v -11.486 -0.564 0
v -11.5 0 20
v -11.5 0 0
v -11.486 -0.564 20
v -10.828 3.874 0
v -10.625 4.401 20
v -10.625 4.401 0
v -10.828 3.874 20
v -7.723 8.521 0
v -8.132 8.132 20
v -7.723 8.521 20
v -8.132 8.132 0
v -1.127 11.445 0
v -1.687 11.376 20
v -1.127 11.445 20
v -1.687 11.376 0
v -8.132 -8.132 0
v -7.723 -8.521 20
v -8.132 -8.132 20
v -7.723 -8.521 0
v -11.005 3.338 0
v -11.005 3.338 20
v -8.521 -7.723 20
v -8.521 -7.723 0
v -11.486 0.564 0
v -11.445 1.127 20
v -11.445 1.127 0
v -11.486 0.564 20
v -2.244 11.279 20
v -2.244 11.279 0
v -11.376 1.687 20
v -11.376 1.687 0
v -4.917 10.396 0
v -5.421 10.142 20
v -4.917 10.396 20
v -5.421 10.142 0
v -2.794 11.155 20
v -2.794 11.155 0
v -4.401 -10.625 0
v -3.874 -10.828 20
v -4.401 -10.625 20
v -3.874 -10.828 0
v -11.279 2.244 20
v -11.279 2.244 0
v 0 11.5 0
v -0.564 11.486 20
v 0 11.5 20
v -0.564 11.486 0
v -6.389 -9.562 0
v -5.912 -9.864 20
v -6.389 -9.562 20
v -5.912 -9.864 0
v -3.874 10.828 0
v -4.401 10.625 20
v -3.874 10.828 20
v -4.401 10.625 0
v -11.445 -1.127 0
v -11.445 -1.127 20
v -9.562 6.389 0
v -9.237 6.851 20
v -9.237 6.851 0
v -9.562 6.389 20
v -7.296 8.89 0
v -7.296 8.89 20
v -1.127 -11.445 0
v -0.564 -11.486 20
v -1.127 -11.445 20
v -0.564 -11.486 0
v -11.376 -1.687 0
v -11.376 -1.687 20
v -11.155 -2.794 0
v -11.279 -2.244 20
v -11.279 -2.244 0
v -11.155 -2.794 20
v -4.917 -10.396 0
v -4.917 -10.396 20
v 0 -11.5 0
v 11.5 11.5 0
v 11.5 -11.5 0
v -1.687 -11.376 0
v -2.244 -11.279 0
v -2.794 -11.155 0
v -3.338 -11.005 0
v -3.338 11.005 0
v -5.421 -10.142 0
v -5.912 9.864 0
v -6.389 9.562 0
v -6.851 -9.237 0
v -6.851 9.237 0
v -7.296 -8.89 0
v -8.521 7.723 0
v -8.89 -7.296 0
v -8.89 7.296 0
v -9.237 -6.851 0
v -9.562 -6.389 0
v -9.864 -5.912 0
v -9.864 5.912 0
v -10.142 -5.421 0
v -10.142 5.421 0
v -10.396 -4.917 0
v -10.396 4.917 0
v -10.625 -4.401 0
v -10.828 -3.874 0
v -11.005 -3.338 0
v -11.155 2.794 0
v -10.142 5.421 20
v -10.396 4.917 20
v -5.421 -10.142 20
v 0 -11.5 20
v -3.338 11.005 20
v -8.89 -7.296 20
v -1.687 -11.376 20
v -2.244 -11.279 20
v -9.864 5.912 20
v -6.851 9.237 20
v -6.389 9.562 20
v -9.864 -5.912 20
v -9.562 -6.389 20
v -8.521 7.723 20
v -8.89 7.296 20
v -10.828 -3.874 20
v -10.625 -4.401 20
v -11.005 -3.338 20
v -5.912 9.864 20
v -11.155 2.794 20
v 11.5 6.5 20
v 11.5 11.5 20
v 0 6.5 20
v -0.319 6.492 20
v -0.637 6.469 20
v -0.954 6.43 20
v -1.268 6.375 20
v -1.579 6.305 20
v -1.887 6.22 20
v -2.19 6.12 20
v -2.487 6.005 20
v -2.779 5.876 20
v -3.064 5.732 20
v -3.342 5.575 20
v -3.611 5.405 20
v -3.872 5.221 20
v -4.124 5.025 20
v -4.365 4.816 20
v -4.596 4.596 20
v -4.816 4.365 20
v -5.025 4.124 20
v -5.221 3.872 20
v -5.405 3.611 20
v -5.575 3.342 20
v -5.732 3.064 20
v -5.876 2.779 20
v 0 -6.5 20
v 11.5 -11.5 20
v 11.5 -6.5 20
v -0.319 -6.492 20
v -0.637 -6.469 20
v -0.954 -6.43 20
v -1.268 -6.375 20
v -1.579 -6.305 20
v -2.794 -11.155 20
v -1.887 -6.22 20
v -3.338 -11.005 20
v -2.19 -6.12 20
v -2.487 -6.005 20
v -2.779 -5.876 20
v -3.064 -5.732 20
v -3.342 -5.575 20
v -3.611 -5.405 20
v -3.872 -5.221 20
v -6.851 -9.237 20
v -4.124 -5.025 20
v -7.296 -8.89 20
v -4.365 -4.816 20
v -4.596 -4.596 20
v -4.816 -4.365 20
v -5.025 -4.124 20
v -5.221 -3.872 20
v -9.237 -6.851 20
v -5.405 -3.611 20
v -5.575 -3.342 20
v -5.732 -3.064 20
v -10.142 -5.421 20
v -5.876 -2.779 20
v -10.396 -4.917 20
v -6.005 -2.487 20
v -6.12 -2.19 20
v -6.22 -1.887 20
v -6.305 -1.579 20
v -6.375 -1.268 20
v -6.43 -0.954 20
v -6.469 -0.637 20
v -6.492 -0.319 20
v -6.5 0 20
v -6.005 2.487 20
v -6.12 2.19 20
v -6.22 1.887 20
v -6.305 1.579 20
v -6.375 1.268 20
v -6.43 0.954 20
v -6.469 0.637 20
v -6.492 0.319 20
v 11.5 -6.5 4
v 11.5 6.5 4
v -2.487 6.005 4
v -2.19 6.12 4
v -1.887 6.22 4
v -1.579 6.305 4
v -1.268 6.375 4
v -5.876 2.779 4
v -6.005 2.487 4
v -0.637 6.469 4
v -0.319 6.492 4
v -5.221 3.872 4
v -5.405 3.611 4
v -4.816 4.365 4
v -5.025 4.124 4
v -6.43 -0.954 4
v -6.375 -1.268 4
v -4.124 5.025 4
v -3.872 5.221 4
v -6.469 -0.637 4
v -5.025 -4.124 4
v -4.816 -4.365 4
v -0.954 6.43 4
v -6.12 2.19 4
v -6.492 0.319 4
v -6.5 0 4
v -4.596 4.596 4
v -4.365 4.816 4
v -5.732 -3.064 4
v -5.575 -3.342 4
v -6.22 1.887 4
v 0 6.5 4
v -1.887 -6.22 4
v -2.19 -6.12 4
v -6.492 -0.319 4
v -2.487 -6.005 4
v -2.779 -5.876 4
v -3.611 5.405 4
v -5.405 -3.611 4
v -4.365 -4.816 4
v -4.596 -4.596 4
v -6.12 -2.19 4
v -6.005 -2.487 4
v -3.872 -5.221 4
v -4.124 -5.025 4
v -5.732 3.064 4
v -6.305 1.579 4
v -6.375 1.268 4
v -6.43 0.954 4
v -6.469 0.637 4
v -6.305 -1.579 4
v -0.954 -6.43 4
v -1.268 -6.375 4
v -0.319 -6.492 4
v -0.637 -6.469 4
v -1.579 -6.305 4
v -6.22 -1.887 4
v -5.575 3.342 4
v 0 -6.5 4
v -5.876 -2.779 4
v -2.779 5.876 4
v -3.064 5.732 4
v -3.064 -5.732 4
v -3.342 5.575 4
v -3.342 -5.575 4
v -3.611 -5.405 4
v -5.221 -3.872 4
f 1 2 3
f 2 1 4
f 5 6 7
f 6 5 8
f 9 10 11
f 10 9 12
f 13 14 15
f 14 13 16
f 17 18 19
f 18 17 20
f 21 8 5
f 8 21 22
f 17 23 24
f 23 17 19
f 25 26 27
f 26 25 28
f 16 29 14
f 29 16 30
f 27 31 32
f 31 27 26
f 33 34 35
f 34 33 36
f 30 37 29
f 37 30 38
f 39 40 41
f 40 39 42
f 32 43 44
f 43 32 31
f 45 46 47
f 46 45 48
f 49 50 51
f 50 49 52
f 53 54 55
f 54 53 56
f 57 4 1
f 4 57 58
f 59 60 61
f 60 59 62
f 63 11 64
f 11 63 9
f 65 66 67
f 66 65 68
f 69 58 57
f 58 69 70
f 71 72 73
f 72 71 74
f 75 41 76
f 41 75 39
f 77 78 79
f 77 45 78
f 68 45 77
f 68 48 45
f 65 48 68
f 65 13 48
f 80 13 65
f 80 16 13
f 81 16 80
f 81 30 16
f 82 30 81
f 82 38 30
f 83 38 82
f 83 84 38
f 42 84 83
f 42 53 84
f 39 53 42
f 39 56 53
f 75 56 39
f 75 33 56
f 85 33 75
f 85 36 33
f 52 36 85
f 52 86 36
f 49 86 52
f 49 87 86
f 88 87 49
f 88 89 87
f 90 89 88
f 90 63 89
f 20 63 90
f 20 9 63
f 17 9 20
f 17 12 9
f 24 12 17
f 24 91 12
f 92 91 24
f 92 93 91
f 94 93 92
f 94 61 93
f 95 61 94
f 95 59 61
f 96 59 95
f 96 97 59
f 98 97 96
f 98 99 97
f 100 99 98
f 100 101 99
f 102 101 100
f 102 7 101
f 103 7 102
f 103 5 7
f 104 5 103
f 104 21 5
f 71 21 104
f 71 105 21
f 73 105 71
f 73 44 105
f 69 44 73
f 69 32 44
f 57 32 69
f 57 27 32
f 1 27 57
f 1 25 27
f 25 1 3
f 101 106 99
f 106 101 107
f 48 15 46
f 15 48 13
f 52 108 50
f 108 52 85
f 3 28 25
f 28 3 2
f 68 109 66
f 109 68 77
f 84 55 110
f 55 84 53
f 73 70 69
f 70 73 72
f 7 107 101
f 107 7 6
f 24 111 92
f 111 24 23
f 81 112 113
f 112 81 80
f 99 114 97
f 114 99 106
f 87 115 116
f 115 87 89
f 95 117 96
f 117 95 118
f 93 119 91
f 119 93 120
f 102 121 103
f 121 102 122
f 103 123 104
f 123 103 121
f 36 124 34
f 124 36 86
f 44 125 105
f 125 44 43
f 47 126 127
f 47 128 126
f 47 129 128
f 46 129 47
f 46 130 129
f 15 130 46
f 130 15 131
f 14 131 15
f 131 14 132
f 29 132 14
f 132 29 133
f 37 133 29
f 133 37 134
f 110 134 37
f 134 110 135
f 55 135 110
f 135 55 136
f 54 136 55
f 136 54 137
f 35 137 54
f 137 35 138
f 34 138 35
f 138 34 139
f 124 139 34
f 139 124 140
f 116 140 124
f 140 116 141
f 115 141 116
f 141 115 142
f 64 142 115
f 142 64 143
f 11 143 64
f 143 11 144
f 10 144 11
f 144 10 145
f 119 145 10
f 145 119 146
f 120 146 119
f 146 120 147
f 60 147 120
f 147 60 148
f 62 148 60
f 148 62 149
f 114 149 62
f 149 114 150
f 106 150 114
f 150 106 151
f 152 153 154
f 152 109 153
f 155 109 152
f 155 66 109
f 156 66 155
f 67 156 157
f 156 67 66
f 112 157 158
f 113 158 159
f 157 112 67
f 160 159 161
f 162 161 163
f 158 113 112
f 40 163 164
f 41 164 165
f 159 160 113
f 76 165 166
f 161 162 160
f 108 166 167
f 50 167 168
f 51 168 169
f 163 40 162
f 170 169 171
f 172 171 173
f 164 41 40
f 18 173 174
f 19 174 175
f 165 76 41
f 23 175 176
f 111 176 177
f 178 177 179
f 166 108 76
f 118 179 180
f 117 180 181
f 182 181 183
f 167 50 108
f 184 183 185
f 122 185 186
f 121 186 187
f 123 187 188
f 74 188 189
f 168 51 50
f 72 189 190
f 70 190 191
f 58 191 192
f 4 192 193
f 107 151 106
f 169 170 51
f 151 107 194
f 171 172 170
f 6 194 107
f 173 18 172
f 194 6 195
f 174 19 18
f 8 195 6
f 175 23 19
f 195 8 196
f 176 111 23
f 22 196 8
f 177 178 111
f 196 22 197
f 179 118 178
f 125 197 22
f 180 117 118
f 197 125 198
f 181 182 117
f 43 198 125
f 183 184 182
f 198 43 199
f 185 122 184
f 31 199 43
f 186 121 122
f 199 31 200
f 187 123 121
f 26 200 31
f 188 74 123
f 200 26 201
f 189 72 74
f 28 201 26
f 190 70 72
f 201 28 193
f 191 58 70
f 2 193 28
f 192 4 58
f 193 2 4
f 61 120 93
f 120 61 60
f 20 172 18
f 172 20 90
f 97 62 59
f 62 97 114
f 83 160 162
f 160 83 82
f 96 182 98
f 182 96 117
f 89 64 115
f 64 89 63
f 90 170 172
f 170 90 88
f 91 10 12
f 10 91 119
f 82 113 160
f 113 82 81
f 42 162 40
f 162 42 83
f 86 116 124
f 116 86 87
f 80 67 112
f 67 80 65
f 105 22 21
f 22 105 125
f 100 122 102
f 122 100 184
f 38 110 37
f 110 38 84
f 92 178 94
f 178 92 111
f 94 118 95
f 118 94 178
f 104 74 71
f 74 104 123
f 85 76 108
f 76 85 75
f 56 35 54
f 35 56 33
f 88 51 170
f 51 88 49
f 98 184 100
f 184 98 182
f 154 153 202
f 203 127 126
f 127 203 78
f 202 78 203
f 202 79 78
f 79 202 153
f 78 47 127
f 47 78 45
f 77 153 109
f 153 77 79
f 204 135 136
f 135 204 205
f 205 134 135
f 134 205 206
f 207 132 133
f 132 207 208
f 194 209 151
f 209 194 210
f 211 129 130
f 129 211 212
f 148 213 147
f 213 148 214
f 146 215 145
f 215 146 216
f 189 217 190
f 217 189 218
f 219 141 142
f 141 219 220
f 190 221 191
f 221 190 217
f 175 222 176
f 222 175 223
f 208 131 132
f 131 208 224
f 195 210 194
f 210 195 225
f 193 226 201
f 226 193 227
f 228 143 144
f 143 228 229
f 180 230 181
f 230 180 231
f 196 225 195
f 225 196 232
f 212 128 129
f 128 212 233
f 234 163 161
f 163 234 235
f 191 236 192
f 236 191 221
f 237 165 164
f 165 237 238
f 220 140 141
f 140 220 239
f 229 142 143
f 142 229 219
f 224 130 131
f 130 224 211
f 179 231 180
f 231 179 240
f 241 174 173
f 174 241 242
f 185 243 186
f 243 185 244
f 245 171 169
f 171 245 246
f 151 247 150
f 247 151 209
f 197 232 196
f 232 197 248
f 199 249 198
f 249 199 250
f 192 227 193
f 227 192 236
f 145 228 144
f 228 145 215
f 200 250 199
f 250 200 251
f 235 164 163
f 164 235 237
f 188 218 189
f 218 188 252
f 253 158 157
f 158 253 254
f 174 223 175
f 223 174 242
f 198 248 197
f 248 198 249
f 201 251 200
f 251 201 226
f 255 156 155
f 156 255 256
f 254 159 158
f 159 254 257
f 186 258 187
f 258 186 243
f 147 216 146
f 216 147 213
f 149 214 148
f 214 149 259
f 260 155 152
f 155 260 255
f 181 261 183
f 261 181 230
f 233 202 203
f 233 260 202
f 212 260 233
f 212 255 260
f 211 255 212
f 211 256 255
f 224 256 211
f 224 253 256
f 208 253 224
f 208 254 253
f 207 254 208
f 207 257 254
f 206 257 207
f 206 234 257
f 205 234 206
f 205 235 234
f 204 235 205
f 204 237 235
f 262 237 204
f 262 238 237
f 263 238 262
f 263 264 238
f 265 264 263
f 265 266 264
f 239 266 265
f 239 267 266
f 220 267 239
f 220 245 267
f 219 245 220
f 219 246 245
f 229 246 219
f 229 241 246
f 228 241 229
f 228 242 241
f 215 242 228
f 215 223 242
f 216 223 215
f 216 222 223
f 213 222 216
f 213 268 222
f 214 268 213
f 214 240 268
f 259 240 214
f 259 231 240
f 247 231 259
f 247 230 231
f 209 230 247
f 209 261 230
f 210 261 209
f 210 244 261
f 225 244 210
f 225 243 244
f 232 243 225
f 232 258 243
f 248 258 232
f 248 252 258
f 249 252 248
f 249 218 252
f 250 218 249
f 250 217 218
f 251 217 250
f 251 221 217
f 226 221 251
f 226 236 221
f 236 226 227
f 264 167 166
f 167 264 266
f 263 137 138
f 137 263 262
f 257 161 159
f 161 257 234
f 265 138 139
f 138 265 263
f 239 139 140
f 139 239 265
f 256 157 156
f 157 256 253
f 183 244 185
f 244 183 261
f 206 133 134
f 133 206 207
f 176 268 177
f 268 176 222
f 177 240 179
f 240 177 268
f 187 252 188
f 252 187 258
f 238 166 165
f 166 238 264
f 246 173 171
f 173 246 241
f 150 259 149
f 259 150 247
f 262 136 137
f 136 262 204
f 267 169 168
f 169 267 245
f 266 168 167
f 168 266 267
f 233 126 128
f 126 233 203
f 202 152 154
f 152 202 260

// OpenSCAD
// The diameter of the dowel hole in mm (you may want to add a mm or two for clearance)
dowel_d = 13;

// The diameter of the flange for mounting the dowel holder (in mm)
flange_d = 0;

/* [Dowel Customization] */

// The height of the dowel holder in mm (inclusive of the height of the flange)
dowel_h = 20;

// The thickness of the wall holding the dowele in mm
dowel_wall = 5;

/* [Flange Customization] */

// The height of the flange in mm
flange_h = 4;

// The diameter (in mm) for the holes placed for mounting the holder (0 disables the holes)
flange_hole_d = 6;

/* [Hidden] */

holder_d = dowel_d + dowel_wall*2;
$fn = 128;

module holder() {
    difference() {
        union() {
            cylinder(d = holder_d, h=dowel_h);
            translate([0, -holder_d/2, 0]) cube([dowel_d/2 + dowel_wall, holder_d, dowel_h]);
        }
        translate([0, 0, flange_h]) union() {
            cylinder(d=dowel_d, h=100);
            translate([0, -dowel_d/2, 0]) cube([100, dowel_d, 100]);
        }
    }
}

module flange() {
    difference() {
        cylinder(d = flange_d, h = flange_h);
        if (flange_hole_d > 0) {
            for (xy = [ [0, 1], [-1, 0], [0, -1] ]) {
                delta = (holder_d + (flange_d - holder_d)/2)/2;
                translate([xy[0] * delta, xy[1] * delta, 0]) cylinder(d=flange_hole_d, h=100);
            }
        }
    }
}

holder();
if (flange_d > 0) {
    flange();
}
